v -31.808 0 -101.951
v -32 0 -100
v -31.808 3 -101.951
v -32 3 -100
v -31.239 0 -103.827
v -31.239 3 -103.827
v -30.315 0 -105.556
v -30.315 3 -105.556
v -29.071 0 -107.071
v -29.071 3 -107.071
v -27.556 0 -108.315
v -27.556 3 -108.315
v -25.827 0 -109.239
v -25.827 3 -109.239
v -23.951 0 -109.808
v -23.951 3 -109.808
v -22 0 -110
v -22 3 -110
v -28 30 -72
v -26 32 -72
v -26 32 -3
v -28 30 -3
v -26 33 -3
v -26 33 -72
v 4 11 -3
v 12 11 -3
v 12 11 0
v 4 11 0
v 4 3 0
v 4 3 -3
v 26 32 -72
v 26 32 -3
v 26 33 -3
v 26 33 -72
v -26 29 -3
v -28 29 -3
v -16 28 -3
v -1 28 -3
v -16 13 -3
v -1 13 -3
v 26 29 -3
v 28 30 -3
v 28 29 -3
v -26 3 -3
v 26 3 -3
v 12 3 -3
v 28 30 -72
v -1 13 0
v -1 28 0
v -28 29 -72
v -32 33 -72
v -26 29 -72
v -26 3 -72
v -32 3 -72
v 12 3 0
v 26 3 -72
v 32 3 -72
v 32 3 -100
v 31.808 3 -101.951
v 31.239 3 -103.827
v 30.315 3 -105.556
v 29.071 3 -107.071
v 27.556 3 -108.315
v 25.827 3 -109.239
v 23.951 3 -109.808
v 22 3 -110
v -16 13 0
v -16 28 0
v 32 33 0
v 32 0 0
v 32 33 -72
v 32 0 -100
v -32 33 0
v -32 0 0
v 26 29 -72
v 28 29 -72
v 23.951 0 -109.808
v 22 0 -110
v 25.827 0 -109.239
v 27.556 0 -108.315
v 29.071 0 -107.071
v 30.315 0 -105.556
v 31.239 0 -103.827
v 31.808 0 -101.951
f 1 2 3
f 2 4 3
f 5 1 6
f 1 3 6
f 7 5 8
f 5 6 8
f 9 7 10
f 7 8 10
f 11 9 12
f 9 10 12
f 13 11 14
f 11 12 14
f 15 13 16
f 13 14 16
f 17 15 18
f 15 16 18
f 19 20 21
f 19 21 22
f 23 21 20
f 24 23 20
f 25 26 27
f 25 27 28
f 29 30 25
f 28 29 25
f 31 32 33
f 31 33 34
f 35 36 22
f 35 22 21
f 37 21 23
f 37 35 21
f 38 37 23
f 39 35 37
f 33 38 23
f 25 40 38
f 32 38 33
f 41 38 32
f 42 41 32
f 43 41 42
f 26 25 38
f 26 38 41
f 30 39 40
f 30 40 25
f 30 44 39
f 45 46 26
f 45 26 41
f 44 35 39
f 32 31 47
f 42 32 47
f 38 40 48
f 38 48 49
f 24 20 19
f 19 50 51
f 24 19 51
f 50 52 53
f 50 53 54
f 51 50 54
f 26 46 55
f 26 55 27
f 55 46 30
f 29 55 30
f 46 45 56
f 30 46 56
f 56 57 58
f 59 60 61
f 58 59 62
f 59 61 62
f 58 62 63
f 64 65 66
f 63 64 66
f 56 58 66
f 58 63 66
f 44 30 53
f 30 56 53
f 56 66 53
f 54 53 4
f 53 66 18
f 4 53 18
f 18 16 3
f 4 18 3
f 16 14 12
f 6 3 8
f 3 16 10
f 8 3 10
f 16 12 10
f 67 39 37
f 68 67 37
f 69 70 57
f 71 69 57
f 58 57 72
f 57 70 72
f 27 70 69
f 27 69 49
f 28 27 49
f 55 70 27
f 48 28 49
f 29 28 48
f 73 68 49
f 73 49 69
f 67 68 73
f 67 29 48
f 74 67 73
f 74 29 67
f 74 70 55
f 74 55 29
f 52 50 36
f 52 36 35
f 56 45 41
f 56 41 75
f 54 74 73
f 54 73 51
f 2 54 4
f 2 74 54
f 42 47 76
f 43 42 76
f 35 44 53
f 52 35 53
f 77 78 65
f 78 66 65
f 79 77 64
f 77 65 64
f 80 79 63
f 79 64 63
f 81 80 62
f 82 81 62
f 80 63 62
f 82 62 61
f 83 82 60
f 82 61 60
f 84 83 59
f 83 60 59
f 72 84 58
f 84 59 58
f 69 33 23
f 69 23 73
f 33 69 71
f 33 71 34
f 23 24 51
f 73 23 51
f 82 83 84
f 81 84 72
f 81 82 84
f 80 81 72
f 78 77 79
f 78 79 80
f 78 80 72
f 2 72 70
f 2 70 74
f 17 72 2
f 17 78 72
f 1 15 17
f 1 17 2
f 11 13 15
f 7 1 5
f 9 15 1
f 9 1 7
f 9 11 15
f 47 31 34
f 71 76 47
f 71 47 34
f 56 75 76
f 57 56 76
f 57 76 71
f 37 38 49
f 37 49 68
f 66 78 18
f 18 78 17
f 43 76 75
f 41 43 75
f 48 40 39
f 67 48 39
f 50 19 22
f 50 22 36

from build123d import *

# Parameters (mm, degrees)
SKETCH1_W            = 32
SKETCH1_H            = 110
BOSS_EXTRUDE1_DEPTH  = 3
SKETCH2_W            = 6
SKETCH2_H            = 69
BOSS_EXTRUDE2_DEPTH  = 30
CUT_EXTRUDE1_DEPTH   = 69
FILLET1_R            = 10
FILLET1_OF_MIRROR1_R = 10
SKETCH4_W            = 15
SKETCH4_H            = 15
SKETCH4_W_2          = 8
SKETCH4_H_2          = 8
CUT_EXTRUDE2_DEPTH   = 117.456000275


with BuildPart() as part:
    # Sketch1 → Boss-Extrude1 (new body)
    with BuildSketch(Plane(origin=(0, 0, 0), x_dir=(1, 0, 0), z_dir=(0, 1, 0))):
        with Locations((16, 55)):
            Rectangle(SKETCH1_W, SKETCH1_H)
    boss_extrude1 = extrude(amount=BOSS_EXTRUDE1_DEPTH)

    # Sketch2 → Boss-Extrude2 (add)
    with BuildSketch(Plane(origin=(0, 3, 0), x_dir=(1, 0, 0), z_dir=(0, 1, 0))):
        Polygon((0, 3), (0, 0), (32, 0), (32, 3), (26, 3), align=None)
        with Locations((29, 37.5)):
            Rectangle(SKETCH2_W, SKETCH2_H)
    boss_extrude2 = extrude(amount=BOSS_EXTRUDE2_DEPTH)

    # Sketch3 → Cut-Extrude1 (cut)
    with BuildSketch(Plane(origin=(0, 0, -72), x_dir=(-1, 0, 0), z_dir=(0, 0, -1))):
        Polygon((-26, 32), (-28, 30), (-28, 29), (-26, 29), align=None)
    cut_extrude1 = extrude(amount=-CUT_EXTRUDE1_DEPTH, mode=Mode.SUBTRACT)

    # Fillet1
    fillet1_edges = [part.edges().sort_by_distance(p)[0] for p in [
        (32, 1.5, -110),
    ]]
    fillet(fillet1_edges, radius=FILLET1_R)

    # Mirror1: Boss-Extrude1, Boss-Extrude2, Cut-Extrude1 across plane
    add(boss_extrude1.mirror(Plane(origin=(0, 3, 0), x_dir=(0, 0, 1), z_dir=(1, 0, 0))))
    add(boss_extrude2.mirror(Plane(origin=(0, 3, 0), x_dir=(0, 0, 1), z_dir=(1, 0, 0))))
    add(cut_extrude1.mirror(Plane(origin=(0, 3, 0), x_dir=(0, 0, 1), z_dir=(1, 0, 0))), mode=Mode.SUBTRACT)

    # Fillet1 of Mirror1
    fillet1_of_mirror1_edges = [part.edges().sort_by_distance(p)[0] for p in [
        (-32, 1.5, -110),
    ]]
    fillet(fillet1_of_mirror1_edges, radius=FILLET1_OF_MIRROR1_R)

    # Sketch4 → Cut-Extrude2 (cut, through all)
    with BuildSketch(Plane(origin=(0, 0, -3), x_dir=(-1, 0, 0), z_dir=(0, 0, -1))):
        with Locations((8.5, 20.5)):
            Rectangle(SKETCH4_W, SKETCH4_H)
        with Locations((-8, 7)):
            Rectangle(SKETCH4_W_2, SKETCH4_H_2)
    extrude(amount=-CUT_EXTRUDE2_DEPTH, mode=Mode.SUBTRACT)


solid = part.part
